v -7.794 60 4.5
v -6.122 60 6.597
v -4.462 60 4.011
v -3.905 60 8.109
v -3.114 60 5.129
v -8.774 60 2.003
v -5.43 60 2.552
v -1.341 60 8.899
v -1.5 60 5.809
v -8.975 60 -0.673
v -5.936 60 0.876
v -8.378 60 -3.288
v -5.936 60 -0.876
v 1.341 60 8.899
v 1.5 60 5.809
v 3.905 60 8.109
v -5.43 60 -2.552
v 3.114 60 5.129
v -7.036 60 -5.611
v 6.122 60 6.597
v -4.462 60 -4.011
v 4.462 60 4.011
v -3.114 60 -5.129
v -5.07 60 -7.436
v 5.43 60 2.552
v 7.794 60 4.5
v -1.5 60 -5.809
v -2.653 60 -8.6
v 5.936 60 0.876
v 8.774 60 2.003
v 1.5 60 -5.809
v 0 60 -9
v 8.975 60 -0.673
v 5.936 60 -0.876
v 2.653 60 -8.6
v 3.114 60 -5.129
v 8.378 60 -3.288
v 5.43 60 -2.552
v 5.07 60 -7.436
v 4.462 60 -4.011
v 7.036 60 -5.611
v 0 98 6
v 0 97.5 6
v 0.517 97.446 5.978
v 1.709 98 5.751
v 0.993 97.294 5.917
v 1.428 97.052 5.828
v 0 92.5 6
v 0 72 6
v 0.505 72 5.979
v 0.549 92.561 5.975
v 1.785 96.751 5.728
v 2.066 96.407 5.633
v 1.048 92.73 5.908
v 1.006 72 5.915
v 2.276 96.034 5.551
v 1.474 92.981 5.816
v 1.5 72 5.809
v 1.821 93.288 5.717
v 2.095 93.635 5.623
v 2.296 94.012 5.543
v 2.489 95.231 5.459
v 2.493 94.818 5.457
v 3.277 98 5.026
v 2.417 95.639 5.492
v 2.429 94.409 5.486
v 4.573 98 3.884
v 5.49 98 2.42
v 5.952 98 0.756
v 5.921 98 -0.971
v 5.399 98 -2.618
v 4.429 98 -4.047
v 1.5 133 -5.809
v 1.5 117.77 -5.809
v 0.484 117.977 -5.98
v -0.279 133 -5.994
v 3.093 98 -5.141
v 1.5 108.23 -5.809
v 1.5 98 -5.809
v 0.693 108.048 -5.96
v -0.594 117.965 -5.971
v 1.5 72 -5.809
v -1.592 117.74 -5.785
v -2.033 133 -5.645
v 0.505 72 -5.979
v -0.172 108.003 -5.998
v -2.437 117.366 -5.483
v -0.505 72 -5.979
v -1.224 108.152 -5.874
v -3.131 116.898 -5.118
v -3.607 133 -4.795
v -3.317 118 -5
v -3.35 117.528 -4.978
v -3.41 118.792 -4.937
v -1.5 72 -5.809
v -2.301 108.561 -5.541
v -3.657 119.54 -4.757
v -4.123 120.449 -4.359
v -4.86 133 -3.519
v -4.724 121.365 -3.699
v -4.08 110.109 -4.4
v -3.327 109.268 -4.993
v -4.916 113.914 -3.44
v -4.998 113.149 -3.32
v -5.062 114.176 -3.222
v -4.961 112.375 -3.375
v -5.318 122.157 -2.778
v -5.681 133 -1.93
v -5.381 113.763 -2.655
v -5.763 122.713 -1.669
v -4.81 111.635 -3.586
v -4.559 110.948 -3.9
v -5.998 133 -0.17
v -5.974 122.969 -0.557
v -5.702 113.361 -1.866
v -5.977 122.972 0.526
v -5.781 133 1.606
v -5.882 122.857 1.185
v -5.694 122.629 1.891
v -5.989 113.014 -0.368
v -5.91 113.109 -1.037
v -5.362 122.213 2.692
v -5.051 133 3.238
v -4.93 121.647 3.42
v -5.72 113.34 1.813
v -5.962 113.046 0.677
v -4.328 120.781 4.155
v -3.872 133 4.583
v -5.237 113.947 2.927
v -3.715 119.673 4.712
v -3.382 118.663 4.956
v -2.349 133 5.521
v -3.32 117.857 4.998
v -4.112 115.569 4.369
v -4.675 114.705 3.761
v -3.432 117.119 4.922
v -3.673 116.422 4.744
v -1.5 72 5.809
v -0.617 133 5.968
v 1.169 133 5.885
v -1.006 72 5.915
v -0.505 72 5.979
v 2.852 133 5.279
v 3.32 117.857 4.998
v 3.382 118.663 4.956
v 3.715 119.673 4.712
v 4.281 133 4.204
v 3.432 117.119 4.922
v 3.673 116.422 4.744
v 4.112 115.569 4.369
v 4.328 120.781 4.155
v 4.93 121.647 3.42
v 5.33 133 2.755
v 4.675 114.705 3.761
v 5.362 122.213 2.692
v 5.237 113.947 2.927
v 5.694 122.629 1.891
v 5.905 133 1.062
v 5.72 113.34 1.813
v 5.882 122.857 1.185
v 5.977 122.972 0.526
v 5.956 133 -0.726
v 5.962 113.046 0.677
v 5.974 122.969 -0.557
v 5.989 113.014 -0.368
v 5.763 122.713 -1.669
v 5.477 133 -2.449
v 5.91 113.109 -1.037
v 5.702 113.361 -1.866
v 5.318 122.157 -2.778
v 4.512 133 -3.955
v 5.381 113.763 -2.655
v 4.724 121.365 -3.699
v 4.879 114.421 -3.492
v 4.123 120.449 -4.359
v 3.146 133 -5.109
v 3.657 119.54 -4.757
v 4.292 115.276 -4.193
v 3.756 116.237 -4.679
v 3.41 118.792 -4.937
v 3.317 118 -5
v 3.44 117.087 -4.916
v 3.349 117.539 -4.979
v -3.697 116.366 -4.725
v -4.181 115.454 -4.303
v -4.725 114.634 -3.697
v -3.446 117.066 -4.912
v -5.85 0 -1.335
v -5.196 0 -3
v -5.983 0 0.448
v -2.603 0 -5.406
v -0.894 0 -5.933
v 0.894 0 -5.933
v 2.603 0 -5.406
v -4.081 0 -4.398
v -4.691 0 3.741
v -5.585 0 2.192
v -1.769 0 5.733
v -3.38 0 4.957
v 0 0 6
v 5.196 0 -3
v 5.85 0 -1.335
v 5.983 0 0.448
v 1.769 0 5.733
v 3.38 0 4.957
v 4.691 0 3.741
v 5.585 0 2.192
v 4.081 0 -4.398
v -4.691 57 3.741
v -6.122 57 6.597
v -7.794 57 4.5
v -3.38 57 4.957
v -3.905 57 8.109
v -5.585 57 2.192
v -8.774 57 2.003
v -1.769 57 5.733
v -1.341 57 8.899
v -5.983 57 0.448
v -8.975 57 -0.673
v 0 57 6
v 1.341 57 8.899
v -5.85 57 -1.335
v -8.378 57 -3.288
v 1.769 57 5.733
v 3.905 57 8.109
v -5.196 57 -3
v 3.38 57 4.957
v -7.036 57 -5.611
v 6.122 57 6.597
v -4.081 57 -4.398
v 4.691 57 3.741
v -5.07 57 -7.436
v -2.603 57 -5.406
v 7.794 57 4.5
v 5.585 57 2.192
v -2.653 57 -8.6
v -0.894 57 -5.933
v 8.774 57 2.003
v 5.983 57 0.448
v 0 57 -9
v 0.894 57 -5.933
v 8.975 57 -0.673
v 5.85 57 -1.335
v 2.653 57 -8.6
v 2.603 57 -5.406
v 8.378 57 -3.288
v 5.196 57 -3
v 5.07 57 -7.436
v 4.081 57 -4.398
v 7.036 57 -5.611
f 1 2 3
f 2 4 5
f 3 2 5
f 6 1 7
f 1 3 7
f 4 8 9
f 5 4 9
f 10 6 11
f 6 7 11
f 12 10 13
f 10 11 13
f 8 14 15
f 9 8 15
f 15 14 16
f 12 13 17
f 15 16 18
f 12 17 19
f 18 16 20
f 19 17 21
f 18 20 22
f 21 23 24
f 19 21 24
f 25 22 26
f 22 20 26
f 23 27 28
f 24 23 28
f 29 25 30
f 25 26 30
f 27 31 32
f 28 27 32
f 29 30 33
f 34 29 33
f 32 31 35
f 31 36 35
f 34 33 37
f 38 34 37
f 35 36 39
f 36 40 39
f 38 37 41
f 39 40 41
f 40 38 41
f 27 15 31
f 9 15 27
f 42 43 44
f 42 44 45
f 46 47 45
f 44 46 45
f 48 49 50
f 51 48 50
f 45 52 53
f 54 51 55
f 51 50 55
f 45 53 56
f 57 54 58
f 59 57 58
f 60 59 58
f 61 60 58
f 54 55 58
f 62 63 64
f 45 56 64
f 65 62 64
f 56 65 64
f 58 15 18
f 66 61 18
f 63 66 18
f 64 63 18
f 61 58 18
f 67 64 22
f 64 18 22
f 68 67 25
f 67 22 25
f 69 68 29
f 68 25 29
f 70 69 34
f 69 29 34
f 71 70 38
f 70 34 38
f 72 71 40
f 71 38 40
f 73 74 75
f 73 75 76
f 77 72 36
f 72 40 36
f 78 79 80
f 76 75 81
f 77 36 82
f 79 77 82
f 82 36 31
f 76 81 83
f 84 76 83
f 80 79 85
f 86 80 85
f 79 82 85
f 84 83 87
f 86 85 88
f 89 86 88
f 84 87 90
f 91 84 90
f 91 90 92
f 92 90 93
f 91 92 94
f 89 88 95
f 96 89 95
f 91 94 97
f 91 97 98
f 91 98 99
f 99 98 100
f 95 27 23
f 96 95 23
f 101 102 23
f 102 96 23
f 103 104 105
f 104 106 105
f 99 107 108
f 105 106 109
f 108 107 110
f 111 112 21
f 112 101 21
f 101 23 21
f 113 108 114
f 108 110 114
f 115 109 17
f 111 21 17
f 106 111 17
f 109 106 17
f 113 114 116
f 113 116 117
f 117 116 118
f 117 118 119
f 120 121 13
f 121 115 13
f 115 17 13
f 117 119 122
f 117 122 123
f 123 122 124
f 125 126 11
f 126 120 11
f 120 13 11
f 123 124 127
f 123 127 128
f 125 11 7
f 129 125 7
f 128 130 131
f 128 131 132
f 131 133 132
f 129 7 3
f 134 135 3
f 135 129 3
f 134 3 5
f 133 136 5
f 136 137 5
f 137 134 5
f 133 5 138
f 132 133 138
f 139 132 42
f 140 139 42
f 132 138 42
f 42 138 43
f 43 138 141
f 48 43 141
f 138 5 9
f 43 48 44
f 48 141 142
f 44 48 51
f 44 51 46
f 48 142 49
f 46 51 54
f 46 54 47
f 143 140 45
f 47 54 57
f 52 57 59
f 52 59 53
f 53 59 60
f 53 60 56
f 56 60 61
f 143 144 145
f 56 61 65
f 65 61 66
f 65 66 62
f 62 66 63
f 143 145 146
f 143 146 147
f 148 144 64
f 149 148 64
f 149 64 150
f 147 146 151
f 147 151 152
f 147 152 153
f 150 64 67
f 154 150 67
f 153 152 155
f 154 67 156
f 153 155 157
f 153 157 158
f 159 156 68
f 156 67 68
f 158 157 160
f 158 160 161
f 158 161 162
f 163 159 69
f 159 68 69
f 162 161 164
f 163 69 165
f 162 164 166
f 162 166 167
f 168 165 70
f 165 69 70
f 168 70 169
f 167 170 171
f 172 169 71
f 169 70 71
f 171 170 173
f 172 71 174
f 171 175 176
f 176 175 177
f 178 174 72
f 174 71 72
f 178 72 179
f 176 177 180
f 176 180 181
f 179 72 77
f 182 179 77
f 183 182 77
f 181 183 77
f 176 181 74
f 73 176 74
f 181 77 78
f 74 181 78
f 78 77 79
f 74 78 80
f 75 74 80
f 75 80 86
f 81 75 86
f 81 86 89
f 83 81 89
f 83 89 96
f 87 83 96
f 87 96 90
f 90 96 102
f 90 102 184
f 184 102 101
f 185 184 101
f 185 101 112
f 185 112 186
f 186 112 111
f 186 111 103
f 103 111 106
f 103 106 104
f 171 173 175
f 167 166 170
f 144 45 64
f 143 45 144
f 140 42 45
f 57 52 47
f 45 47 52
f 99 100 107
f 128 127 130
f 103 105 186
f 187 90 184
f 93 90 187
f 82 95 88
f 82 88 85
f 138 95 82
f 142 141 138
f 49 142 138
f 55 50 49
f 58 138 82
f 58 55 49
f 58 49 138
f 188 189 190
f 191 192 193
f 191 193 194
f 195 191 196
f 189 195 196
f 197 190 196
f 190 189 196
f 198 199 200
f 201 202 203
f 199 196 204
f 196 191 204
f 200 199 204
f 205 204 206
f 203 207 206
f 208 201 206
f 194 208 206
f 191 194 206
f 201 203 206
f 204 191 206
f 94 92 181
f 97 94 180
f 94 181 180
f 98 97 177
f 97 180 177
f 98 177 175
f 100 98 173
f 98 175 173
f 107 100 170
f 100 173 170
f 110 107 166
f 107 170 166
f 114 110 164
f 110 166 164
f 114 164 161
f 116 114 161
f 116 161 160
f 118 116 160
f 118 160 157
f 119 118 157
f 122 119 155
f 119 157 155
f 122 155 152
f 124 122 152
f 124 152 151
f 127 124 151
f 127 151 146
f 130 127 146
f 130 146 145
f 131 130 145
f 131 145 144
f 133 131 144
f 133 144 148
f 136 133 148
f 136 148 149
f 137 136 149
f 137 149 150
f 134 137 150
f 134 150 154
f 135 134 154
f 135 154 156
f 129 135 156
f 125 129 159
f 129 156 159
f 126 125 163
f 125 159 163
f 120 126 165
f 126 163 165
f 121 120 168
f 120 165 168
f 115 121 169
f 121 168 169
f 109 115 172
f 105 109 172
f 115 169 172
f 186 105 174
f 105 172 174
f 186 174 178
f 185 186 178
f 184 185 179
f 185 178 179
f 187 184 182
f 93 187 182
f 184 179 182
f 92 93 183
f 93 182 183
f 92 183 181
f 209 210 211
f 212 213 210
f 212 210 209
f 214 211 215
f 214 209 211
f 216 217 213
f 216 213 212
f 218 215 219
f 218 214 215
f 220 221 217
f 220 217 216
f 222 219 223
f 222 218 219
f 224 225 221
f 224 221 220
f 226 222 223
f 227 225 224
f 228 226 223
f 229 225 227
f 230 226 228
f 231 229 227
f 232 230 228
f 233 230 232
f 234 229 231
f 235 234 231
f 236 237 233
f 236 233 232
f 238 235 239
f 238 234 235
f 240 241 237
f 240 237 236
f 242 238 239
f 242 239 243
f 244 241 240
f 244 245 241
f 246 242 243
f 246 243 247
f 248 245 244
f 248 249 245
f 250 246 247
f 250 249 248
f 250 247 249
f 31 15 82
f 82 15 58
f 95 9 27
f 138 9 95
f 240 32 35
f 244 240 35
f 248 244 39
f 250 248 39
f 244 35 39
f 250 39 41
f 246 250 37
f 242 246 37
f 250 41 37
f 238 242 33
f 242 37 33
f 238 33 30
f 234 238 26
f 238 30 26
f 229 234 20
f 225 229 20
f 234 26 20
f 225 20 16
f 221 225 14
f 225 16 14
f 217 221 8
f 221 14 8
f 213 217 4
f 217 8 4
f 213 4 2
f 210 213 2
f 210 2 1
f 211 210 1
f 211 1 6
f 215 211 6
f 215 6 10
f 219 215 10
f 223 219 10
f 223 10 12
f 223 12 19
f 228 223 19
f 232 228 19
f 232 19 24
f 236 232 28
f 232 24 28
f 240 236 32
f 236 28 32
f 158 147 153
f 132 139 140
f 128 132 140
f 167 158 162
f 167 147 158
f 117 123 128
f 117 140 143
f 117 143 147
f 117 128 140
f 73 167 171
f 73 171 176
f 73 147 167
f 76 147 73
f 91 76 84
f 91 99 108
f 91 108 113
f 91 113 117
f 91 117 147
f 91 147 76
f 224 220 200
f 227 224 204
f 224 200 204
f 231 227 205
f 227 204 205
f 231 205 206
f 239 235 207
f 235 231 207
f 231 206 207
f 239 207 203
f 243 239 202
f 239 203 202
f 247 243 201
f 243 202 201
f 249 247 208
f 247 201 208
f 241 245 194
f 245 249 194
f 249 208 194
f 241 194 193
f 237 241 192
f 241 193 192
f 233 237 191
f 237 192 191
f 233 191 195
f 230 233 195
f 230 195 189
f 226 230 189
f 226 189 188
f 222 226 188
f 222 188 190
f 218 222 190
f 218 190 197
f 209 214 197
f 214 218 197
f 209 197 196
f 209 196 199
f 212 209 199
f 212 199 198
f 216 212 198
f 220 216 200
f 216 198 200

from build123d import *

# Parameters (mm, degrees)
SKETCH1_R           = 6
BOSS_EXTRUDE1_DEPTH = 100
SKETCH2_W           = 3
SKETCH2_H           = 12
CUT_EXTRUDE2_DEPTH  = 50
SKETCH3_R           = 2.5
CUT_EXTRUDE3_DEPTH  = 50
BOSS_EXTRUDE2_START = -60
SKETCH4_R           = 9
BOSS_EXTRUDE2_DEPTH = 3
SKETCH5_R           = 6
BOSS_EXTRUDE3_DEPTH = 10
SKETCH6_R           = 2.5
CUT_EXTRUDE4_DEPTH  = 10
SKETCH7_R           = 6
CUT_EXTRUDE5_DEPTH  = 12
SKETCH8_R           = 6
BOSS_EXTRUDE4_DEPTH = 30
SKETCH10_R          = 5
CUT_EXTRUDE6_DEPTH  = 30
BOSS_EXTRUDE5_START = -40
SKETCH11_R          = 6
BOSS_EXTRUDE5_DEPTH = 40
SKETCH12_R          = 6
BOSS_EXTRUDE6_DEPTH = 5
SKETCH13_R          = 5
CUT_EXTRUDE7_DEPTH  = 27.5


with BuildPart() as part:
    # Sketch1 → Boss-Extrude1 (new body)
    with BuildSketch(Plane(origin=(0, 0, 0), x_dir=(1, 0, 0), z_dir=(0, 1, 0))):
        with Locations(Location((0, 0, 0), (0, 0, 270))):
            Circle(SKETCH1_R)
    extrude(amount=BOSS_EXTRUDE1_DEPTH)

    # Sketch2 → Cut-Extrude2 (cut, symmetric)
    with BuildSketch(Plane.XY):
        with Locations((0, 66)):
            Rectangle(SKETCH2_W, SKETCH2_H)
    extrude(amount=CUT_EXTRUDE2_DEPTH, both=True, mode=Mode.SUBTRACT)

    # Sketch3 → Cut-Extrude3 (cut, symmetric)
    with BuildSketch(Plane.XY):
        with Locations(Location((0, 95, 0), (0, 0, 90))):
            Circle(SKETCH3_R)
    extrude(amount=CUT_EXTRUDE3_DEPTH, both=True, mode=Mode.SUBTRACT)

    # Sketch4 → Boss-Extrude2 (add)
    with BuildSketch(Plane.XZ.offset(BOSS_EXTRUDE2_START)):
        with Locations(Location((0, 0, 0), (0, 0, 270))):
            Circle(SKETCH4_R)
    extrude(amount=BOSS_EXTRUDE2_DEPTH)

    # Sketch5 → Boss-Extrude3 (add, symmetric)
    with BuildSketch(Plane(origin=(0, 100, 0), x_dir=(1, 0, 0), z_dir=(0, 1, 0))):
        with Locations(Location((0, 0, 0), (0, 0, 90))):
            Circle(SKETCH5_R)
    extrude(amount=BOSS_EXTRUDE3_DEPTH, both=True)

    # Sketch6 → Cut-Extrude4 (cut, symmetric)
    with BuildSketch(Plane.XY):
        with Locations((0, 105)):
            Circle(SKETCH6_R)
    extrude(amount=CUT_EXTRUDE4_DEPTH, both=True, mode=Mode.SUBTRACT)

    # Sketch7 → Cut-Extrude5 (cut)
    with BuildSketch(Plane(origin=(0, 110, 0), x_dir=(1, 0, 0), z_dir=(0, 1, 0))):
        with Locations(Location((0, 0, 0), (0, 0, 75.522487814))):
            Circle(SKETCH7_R)
    extrude(amount=-CUT_EXTRUDE5_DEPTH, mode=Mode.SUBTRACT)

    # Sketch8 → Boss-Extrude4 (add)
    with BuildSketch(Plane(origin=(0, 98, 0), x_dir=(1, 0, 0), z_dir=(0, 1, 0))):
        with Locations(Location((0, 0, 0), (0, 0, 75.522487814))):
            Circle(SKETCH8_R)
    extrude(amount=BOSS_EXTRUDE4_DEPTH)

    # Sketch10 → Cut-Extrude6 (cut, symmetric)
    with BuildSketch(Plane.XY):
        with Locations((0, 113)):
            Circle(SKETCH10_R)
    extrude(amount=CUT_EXTRUDE6_DEPTH, both=True, mode=Mode.SUBTRACT)

    # Sketch11 → Boss-Extrude5 (add)
    with BuildSketch(Plane(origin=(0, 128, 0), x_dir=(1, 0, 0), z_dir=(0, 1, 0)).offset(BOSS_EXTRUDE5_START)):
        with Locations(Location((0, 0, 0), (0, 0, 75.522487814))):
            Circle(SKETCH11_R)
    extrude(amount=BOSS_EXTRUDE5_DEPTH)

    # Sketch12 → Boss-Extrude6 (add)
    with BuildSketch(Plane(origin=(0, 128, 0), x_dir=(1, 0, 0), z_dir=(0, 1, 0))):
        with Locations(Location((0, 0, 0), (0, 0, 75.522487814))):
            Circle(SKETCH12_R)
    extrude(amount=BOSS_EXTRUDE6_DEPTH)

    # Sketch13 → Cut-Extrude7 (cut, symmetric)
    with BuildSketch(Plane(origin=(0, 0, 0), x_dir=(0, 0, -1), z_dir=(1, 0, 0))):
        with Locations((0, 118)):
            Circle(SKETCH13_R)
    extrude(amount=CUT_EXTRUDE7_DEPTH, both=True, mode=Mode.SUBTRACT)


solid = part.part
